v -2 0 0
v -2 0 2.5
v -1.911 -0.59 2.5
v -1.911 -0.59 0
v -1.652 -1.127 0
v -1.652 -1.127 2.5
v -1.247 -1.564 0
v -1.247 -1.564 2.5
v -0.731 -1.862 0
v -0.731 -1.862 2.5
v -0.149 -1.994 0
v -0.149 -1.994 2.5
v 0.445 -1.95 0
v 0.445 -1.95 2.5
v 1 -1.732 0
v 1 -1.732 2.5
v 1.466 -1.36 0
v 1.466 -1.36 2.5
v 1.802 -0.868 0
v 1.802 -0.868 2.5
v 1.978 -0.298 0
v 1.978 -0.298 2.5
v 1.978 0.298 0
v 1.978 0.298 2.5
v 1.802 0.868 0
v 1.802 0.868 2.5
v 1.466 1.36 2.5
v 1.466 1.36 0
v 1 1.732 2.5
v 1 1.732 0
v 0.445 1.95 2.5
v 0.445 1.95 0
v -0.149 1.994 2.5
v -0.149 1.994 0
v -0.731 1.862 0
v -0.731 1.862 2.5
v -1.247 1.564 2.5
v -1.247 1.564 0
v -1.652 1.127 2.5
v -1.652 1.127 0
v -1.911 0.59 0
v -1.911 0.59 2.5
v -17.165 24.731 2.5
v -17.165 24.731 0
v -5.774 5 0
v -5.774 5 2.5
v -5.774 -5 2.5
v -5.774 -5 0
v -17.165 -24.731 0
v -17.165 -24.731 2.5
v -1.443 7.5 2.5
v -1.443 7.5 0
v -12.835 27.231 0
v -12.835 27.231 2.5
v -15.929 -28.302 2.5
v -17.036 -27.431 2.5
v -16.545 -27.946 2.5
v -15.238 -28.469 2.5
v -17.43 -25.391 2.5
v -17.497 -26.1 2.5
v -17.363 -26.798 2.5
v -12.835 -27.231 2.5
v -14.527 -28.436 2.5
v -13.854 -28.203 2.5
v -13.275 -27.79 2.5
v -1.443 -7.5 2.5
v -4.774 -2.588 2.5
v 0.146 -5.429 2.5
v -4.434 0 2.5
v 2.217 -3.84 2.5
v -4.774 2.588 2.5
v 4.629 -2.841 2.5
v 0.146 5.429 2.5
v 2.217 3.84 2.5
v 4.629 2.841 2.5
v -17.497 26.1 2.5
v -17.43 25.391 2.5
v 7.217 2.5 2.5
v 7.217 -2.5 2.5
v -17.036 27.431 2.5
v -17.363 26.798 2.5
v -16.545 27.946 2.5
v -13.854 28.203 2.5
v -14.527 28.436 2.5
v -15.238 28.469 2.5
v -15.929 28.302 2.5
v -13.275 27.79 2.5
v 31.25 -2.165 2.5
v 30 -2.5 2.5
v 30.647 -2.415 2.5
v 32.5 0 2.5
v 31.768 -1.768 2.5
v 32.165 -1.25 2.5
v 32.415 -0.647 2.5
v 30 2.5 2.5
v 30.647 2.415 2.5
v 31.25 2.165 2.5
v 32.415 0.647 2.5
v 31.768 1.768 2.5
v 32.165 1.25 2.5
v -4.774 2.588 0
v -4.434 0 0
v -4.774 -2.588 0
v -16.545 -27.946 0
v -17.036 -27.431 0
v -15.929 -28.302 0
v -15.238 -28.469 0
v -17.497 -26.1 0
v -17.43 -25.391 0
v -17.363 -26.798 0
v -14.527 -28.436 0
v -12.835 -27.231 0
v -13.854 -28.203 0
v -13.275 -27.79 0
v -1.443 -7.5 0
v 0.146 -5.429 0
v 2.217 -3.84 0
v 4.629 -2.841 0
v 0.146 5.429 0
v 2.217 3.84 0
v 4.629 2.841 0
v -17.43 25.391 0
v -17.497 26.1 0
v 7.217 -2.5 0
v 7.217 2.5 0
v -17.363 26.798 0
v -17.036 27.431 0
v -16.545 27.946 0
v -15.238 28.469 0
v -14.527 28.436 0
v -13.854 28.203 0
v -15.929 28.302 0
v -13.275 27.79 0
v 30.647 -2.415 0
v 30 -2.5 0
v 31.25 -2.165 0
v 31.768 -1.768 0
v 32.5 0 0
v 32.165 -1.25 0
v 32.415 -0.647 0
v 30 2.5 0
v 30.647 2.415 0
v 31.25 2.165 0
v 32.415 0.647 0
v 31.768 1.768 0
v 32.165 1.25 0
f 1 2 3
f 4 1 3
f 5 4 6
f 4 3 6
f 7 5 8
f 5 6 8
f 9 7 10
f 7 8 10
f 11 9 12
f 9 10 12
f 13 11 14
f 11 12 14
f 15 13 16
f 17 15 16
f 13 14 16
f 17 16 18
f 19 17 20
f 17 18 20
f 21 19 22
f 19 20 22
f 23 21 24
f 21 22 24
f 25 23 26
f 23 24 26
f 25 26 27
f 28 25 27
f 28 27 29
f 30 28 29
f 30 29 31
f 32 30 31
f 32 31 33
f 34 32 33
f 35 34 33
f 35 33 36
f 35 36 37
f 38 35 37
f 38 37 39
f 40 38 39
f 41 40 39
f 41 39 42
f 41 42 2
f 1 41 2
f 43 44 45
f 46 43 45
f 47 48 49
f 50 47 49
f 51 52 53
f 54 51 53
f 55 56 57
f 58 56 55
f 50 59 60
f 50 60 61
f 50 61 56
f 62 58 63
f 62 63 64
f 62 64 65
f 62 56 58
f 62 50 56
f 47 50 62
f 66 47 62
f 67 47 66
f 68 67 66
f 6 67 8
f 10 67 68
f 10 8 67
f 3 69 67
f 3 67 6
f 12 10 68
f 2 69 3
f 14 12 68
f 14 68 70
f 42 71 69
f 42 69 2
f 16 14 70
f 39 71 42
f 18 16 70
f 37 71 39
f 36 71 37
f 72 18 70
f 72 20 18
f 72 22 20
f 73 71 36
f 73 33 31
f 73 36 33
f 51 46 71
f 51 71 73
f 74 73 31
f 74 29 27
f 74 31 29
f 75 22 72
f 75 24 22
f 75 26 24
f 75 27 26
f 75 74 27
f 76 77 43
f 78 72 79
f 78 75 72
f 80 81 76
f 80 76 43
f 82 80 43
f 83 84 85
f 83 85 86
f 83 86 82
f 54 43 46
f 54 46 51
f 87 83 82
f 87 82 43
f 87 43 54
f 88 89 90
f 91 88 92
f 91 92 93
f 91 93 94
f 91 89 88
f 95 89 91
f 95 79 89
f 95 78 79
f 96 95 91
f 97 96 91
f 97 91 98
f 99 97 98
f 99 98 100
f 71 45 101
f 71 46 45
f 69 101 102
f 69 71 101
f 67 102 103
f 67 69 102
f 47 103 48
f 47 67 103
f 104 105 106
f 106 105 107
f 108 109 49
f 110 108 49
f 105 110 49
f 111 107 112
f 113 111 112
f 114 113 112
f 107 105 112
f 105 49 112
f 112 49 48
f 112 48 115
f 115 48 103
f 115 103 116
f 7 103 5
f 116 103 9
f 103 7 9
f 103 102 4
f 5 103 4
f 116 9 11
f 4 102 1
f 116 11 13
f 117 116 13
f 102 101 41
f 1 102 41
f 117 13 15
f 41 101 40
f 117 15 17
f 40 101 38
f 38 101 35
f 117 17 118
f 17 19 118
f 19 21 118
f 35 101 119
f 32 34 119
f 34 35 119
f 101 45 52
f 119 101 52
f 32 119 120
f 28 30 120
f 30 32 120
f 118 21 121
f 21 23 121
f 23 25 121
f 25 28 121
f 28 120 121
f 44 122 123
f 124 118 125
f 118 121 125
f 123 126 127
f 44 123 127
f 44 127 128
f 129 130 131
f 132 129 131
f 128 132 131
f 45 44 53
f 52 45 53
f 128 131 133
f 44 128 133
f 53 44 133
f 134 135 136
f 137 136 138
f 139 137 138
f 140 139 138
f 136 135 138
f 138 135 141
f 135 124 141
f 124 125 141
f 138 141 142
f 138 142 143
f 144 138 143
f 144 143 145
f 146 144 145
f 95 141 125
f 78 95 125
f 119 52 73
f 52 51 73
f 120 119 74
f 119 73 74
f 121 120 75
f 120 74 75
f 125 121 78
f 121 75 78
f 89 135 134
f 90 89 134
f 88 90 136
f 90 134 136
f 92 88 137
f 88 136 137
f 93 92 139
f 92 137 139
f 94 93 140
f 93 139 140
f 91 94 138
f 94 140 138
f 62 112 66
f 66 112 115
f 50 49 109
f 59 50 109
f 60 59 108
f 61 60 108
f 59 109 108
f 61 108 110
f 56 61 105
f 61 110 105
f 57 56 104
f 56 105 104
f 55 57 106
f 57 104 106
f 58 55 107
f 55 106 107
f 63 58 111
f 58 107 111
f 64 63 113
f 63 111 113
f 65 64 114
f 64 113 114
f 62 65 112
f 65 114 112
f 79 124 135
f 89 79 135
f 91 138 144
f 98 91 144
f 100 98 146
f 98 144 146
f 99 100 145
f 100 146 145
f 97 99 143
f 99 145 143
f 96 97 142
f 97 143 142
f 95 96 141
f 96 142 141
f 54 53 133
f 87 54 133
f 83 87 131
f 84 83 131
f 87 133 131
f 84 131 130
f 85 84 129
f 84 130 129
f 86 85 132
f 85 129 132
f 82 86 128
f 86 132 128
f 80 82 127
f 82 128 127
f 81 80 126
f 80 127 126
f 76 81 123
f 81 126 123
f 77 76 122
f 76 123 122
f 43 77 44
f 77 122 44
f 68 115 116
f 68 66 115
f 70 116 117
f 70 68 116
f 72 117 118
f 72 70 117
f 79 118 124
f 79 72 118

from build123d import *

# Parameters (mm, degrees)
F1_DEPTH = 2.5
F3_D     = 4
F4_R     = 10


with BuildPart() as f1:
    # F0 (on Top) → F1 (new body)
    with BuildSketch(Plane.XY):
        with BuildLine():
            ThreePointArc((2.1650635095, -1.25), (2.4148145657, -0.6470476128), (2.5, 0))
            Line((2.5, 0), (0, 0))
            Line((0, 0), (-1.25, -2.1650635095))
            ThreePointArc((-1.25, -2.1650635095), (-0.6470476128, -2.4148145657), (0, -2.5))
            ThreePointArc((0, -2.5), (1.25, -2.1650635095), (2.1650635095, -1.25))
        make_face()
        with BuildLine():
            Line((-1.25, -2.1650635095), (0, 0))
            Line((0, 0), (-1.25, 2.1650635095))
            ThreePointArc((-1.25, 2.1650635095), (-1.767766953, 1.767766953), (-2.1650635095, 1.25))
            ThreePointArc((-2.1650635095, 1.25), (-2.5, 0), (-2.1650635095, -1.25))
            ThreePointArc((-2.1650635095, -1.25), (-1.767766953, -1.767766953), (-1.25, -2.1650635095))
        make_face()
        with BuildLine():
            ThreePointArc((30, -2.5), (31.767766953, -1.767766953), (32.5, 0))
            ThreePointArc((32.5, 0), (31.767766953, 1.767766953), (30, 2.5))
            ThreePointArc((30, 2.5), (28.232233047, 1.767766953), (27.5, 0))
            ThreePointArc((27.5, 0), (28.232233047, -1.767766953), (30, -2.5))
        make_face()
        with BuildLine():
            ThreePointArc((-12.5, 25.9807621135), (-12.5851854343, 26.6278097263), (-12.8349364905, 27.2307621135))
            ThreePointArc((-12.8349364905, 27.2307621135), (-16.25, 28.145825623), (-17.1650635095, 24.7307621135))
            ThreePointArc((-17.1650635095, 24.7307621135), (-15.6470476128, 23.5659475478), (-13.75, 23.8156986041))
            ThreePointArc((-13.75, 23.8156986041), (-12.8349364905, 24.7307621135), (-12.5, 25.9807621135))
        make_face()
        with BuildLine():
            ThreePointArc((-17.1650635095, -24.7307621135), (-16.25, -28.145825623), (-12.8349364905, -27.2307621135))
            ThreePointArc((-12.8349364905, -27.2307621135), (-12.5851854343, -26.6278097263), (-12.5, -25.9807621135))
            ThreePointArc((-12.5, -25.9807621135), (-12.8349364905, -24.7307621135), (-13.75, -23.8156986041))
            ThreePointArc((-13.75, -23.8156986041), (-15.6470476128, -23.5659475478), (-17.1650635095, -24.7307621135))
        make_face()
        with BuildLine():
            ThreePointArc((27.5, 0), (28.232233047, 1.767766953), (30, 2.5))
            Line((30, 2.5), (1.443375673, 2.5))
            Line((1.443375673, 2.5), (2.1650635095, 1.25))
            ThreePointArc((2.1650635095, 1.25), (2.4148145657, 0.6470476128), (2.5, 0))
            Line((2.5, 0), (27.5, 0))
        make_face()
        with BuildLine():
            Line((1.443375673, -2.5), (30, -2.5))
            ThreePointArc((30, -2.5), (28.232233047, -1.767766953), (27.5, 0))
            Line((27.5, 0), (2.5, 0))
            ThreePointArc((2.5, 0), (2.4148145657, -0.6470476128), (2.1650635095, -1.25))
            Line((2.1650635095, -1.25), (1.443375673, -2.5))
        make_face()
        with BuildLine():
            Line((-12.8349364905, -27.2307621135), (1.443375673, -2.5))
            Line((1.443375673, -2.5), (0, -2.5))
            ThreePointArc((0, -2.5), (-0.6470476128, -2.4148145657), (-1.25, -2.1650635095))
            Line((-1.25, -2.1650635095), (-13.75, -23.8156986041))
            ThreePointArc((-13.75, -23.8156986041), (-12.8349364905, -24.7307621135), (-12.5, -25.9807621135))
            ThreePointArc((-12.5, -25.9807621135), (-12.5851854343, -26.6278097263), (-12.8349364905, -27.2307621135))
        make_face()
        with BuildLine():
            Line((0, 2.5), (1.443375673, 2.5))
            Line((1.443375673, 2.5), (-12.8349364905, 27.2307621135))
            ThreePointArc((-12.8349364905, 27.2307621135), (-12.5851854343, 26.6278097263), (-12.5, 25.9807621135))
            ThreePointArc((-12.5, 25.9807621135), (-12.8349364905, 24.7307621135), (-13.75, 23.8156986041))
            Line((-13.75, 23.8156986041), (-1.25, 2.1650635095))
            ThreePointArc((-1.25, 2.1650635095), (-0.6470476128, 2.4148145657), (0, 2.5))
        make_face()
        with BuildLine():
            Line((-13.75, -23.8156986041), (-1.25, -2.1650635095))
            ThreePointArc((-1.25, -2.1650635095), (-1.767766953, -1.767766953), (-2.1650635095, -1.25))
            Line((-2.1650635095, -1.25), (-2.8867513459, 0))
            Line((-2.8867513459, 0), (-17.1650635095, -24.7307621135))
            ThreePointArc((-17.1650635095, -24.7307621135), (-15.6470476128, -23.5659475478), (-13.75, -23.8156986041))
        make_face()
        with BuildLine():
            ThreePointArc((-2.1650635095, 1.25), (-1.767766953, 1.767766953), (-1.25, 2.1650635095))
            Line((-1.25, 2.1650635095), (-13.75, 23.8156986041))
            ThreePointArc((-13.75, 23.8156986041), (-15.6470476128, 23.5659475478), (-17.1650635095, 24.7307621135))
            Line((-17.1650635095, 24.7307621135), (-2.8867513459, 0))
            Line((-2.8867513459, 0), (-2.1650635095, 1.25))
        make_face()
        with BuildLine():
            Line((0, 0), (2.5, 0))
            ThreePointArc((2.5, 0), (2.4148145657, 0.6470476128), (2.1650635095, 1.25))
            ThreePointArc((2.1650635095, 1.25), (1.25, 2.1650635095), (0, 2.5))
            ThreePointArc((0, 2.5), (-0.6470476128, 2.4148145657), (-1.25, 2.1650635095))
            Line((-1.25, 2.1650635095), (0, 0))
        make_face()
        with BuildLine():
            Line((0, -2.5), (1.443375673, -2.5))
            Line((1.443375673, -2.5), (2.1650635095, -1.25))
            ThreePointArc((2.1650635095, -1.25), (1.25, -2.1650635095), (0, -2.5))
        make_face()
        with BuildLine():
            Line((2.1650635095, 1.25), (1.443375673, 2.5))
            Line((1.443375673, 2.5), (0, 2.5))
            ThreePointArc((0, 2.5), (1.25, 2.1650635095), (2.1650635095, 1.25))
        make_face()
        with BuildLine():
            ThreePointArc((-2.1650635095, -1.25), (-2.5, 0), (-2.1650635095, 1.25))
            Line((-2.1650635095, 1.25), (-2.8867513459, 0))
            Line((-2.8867513459, 0), (-2.1650635095, -1.25))
        make_face()
    extrude(amount=F1_DEPTH)

    # F3 (through all)
    with Locations(Plane(origin=(0, 0, 0), x_dir=(1, 0, 0), z_dir=(0, 0, -1))):
        with Locations((0, 0)):
            Hole(F3_D / 2)

    # F4
    f4_edges = [f1.edges().sort_by_distance(p)[0] for p in [
        (1.443376, -2.5, 1.25),
        (-2.886751, 0, 1.25),
        (1.443376, 2.5, 1.25),
    ]]
    fillet(f4_edges, radius=F4_R)


solid = f1.part
